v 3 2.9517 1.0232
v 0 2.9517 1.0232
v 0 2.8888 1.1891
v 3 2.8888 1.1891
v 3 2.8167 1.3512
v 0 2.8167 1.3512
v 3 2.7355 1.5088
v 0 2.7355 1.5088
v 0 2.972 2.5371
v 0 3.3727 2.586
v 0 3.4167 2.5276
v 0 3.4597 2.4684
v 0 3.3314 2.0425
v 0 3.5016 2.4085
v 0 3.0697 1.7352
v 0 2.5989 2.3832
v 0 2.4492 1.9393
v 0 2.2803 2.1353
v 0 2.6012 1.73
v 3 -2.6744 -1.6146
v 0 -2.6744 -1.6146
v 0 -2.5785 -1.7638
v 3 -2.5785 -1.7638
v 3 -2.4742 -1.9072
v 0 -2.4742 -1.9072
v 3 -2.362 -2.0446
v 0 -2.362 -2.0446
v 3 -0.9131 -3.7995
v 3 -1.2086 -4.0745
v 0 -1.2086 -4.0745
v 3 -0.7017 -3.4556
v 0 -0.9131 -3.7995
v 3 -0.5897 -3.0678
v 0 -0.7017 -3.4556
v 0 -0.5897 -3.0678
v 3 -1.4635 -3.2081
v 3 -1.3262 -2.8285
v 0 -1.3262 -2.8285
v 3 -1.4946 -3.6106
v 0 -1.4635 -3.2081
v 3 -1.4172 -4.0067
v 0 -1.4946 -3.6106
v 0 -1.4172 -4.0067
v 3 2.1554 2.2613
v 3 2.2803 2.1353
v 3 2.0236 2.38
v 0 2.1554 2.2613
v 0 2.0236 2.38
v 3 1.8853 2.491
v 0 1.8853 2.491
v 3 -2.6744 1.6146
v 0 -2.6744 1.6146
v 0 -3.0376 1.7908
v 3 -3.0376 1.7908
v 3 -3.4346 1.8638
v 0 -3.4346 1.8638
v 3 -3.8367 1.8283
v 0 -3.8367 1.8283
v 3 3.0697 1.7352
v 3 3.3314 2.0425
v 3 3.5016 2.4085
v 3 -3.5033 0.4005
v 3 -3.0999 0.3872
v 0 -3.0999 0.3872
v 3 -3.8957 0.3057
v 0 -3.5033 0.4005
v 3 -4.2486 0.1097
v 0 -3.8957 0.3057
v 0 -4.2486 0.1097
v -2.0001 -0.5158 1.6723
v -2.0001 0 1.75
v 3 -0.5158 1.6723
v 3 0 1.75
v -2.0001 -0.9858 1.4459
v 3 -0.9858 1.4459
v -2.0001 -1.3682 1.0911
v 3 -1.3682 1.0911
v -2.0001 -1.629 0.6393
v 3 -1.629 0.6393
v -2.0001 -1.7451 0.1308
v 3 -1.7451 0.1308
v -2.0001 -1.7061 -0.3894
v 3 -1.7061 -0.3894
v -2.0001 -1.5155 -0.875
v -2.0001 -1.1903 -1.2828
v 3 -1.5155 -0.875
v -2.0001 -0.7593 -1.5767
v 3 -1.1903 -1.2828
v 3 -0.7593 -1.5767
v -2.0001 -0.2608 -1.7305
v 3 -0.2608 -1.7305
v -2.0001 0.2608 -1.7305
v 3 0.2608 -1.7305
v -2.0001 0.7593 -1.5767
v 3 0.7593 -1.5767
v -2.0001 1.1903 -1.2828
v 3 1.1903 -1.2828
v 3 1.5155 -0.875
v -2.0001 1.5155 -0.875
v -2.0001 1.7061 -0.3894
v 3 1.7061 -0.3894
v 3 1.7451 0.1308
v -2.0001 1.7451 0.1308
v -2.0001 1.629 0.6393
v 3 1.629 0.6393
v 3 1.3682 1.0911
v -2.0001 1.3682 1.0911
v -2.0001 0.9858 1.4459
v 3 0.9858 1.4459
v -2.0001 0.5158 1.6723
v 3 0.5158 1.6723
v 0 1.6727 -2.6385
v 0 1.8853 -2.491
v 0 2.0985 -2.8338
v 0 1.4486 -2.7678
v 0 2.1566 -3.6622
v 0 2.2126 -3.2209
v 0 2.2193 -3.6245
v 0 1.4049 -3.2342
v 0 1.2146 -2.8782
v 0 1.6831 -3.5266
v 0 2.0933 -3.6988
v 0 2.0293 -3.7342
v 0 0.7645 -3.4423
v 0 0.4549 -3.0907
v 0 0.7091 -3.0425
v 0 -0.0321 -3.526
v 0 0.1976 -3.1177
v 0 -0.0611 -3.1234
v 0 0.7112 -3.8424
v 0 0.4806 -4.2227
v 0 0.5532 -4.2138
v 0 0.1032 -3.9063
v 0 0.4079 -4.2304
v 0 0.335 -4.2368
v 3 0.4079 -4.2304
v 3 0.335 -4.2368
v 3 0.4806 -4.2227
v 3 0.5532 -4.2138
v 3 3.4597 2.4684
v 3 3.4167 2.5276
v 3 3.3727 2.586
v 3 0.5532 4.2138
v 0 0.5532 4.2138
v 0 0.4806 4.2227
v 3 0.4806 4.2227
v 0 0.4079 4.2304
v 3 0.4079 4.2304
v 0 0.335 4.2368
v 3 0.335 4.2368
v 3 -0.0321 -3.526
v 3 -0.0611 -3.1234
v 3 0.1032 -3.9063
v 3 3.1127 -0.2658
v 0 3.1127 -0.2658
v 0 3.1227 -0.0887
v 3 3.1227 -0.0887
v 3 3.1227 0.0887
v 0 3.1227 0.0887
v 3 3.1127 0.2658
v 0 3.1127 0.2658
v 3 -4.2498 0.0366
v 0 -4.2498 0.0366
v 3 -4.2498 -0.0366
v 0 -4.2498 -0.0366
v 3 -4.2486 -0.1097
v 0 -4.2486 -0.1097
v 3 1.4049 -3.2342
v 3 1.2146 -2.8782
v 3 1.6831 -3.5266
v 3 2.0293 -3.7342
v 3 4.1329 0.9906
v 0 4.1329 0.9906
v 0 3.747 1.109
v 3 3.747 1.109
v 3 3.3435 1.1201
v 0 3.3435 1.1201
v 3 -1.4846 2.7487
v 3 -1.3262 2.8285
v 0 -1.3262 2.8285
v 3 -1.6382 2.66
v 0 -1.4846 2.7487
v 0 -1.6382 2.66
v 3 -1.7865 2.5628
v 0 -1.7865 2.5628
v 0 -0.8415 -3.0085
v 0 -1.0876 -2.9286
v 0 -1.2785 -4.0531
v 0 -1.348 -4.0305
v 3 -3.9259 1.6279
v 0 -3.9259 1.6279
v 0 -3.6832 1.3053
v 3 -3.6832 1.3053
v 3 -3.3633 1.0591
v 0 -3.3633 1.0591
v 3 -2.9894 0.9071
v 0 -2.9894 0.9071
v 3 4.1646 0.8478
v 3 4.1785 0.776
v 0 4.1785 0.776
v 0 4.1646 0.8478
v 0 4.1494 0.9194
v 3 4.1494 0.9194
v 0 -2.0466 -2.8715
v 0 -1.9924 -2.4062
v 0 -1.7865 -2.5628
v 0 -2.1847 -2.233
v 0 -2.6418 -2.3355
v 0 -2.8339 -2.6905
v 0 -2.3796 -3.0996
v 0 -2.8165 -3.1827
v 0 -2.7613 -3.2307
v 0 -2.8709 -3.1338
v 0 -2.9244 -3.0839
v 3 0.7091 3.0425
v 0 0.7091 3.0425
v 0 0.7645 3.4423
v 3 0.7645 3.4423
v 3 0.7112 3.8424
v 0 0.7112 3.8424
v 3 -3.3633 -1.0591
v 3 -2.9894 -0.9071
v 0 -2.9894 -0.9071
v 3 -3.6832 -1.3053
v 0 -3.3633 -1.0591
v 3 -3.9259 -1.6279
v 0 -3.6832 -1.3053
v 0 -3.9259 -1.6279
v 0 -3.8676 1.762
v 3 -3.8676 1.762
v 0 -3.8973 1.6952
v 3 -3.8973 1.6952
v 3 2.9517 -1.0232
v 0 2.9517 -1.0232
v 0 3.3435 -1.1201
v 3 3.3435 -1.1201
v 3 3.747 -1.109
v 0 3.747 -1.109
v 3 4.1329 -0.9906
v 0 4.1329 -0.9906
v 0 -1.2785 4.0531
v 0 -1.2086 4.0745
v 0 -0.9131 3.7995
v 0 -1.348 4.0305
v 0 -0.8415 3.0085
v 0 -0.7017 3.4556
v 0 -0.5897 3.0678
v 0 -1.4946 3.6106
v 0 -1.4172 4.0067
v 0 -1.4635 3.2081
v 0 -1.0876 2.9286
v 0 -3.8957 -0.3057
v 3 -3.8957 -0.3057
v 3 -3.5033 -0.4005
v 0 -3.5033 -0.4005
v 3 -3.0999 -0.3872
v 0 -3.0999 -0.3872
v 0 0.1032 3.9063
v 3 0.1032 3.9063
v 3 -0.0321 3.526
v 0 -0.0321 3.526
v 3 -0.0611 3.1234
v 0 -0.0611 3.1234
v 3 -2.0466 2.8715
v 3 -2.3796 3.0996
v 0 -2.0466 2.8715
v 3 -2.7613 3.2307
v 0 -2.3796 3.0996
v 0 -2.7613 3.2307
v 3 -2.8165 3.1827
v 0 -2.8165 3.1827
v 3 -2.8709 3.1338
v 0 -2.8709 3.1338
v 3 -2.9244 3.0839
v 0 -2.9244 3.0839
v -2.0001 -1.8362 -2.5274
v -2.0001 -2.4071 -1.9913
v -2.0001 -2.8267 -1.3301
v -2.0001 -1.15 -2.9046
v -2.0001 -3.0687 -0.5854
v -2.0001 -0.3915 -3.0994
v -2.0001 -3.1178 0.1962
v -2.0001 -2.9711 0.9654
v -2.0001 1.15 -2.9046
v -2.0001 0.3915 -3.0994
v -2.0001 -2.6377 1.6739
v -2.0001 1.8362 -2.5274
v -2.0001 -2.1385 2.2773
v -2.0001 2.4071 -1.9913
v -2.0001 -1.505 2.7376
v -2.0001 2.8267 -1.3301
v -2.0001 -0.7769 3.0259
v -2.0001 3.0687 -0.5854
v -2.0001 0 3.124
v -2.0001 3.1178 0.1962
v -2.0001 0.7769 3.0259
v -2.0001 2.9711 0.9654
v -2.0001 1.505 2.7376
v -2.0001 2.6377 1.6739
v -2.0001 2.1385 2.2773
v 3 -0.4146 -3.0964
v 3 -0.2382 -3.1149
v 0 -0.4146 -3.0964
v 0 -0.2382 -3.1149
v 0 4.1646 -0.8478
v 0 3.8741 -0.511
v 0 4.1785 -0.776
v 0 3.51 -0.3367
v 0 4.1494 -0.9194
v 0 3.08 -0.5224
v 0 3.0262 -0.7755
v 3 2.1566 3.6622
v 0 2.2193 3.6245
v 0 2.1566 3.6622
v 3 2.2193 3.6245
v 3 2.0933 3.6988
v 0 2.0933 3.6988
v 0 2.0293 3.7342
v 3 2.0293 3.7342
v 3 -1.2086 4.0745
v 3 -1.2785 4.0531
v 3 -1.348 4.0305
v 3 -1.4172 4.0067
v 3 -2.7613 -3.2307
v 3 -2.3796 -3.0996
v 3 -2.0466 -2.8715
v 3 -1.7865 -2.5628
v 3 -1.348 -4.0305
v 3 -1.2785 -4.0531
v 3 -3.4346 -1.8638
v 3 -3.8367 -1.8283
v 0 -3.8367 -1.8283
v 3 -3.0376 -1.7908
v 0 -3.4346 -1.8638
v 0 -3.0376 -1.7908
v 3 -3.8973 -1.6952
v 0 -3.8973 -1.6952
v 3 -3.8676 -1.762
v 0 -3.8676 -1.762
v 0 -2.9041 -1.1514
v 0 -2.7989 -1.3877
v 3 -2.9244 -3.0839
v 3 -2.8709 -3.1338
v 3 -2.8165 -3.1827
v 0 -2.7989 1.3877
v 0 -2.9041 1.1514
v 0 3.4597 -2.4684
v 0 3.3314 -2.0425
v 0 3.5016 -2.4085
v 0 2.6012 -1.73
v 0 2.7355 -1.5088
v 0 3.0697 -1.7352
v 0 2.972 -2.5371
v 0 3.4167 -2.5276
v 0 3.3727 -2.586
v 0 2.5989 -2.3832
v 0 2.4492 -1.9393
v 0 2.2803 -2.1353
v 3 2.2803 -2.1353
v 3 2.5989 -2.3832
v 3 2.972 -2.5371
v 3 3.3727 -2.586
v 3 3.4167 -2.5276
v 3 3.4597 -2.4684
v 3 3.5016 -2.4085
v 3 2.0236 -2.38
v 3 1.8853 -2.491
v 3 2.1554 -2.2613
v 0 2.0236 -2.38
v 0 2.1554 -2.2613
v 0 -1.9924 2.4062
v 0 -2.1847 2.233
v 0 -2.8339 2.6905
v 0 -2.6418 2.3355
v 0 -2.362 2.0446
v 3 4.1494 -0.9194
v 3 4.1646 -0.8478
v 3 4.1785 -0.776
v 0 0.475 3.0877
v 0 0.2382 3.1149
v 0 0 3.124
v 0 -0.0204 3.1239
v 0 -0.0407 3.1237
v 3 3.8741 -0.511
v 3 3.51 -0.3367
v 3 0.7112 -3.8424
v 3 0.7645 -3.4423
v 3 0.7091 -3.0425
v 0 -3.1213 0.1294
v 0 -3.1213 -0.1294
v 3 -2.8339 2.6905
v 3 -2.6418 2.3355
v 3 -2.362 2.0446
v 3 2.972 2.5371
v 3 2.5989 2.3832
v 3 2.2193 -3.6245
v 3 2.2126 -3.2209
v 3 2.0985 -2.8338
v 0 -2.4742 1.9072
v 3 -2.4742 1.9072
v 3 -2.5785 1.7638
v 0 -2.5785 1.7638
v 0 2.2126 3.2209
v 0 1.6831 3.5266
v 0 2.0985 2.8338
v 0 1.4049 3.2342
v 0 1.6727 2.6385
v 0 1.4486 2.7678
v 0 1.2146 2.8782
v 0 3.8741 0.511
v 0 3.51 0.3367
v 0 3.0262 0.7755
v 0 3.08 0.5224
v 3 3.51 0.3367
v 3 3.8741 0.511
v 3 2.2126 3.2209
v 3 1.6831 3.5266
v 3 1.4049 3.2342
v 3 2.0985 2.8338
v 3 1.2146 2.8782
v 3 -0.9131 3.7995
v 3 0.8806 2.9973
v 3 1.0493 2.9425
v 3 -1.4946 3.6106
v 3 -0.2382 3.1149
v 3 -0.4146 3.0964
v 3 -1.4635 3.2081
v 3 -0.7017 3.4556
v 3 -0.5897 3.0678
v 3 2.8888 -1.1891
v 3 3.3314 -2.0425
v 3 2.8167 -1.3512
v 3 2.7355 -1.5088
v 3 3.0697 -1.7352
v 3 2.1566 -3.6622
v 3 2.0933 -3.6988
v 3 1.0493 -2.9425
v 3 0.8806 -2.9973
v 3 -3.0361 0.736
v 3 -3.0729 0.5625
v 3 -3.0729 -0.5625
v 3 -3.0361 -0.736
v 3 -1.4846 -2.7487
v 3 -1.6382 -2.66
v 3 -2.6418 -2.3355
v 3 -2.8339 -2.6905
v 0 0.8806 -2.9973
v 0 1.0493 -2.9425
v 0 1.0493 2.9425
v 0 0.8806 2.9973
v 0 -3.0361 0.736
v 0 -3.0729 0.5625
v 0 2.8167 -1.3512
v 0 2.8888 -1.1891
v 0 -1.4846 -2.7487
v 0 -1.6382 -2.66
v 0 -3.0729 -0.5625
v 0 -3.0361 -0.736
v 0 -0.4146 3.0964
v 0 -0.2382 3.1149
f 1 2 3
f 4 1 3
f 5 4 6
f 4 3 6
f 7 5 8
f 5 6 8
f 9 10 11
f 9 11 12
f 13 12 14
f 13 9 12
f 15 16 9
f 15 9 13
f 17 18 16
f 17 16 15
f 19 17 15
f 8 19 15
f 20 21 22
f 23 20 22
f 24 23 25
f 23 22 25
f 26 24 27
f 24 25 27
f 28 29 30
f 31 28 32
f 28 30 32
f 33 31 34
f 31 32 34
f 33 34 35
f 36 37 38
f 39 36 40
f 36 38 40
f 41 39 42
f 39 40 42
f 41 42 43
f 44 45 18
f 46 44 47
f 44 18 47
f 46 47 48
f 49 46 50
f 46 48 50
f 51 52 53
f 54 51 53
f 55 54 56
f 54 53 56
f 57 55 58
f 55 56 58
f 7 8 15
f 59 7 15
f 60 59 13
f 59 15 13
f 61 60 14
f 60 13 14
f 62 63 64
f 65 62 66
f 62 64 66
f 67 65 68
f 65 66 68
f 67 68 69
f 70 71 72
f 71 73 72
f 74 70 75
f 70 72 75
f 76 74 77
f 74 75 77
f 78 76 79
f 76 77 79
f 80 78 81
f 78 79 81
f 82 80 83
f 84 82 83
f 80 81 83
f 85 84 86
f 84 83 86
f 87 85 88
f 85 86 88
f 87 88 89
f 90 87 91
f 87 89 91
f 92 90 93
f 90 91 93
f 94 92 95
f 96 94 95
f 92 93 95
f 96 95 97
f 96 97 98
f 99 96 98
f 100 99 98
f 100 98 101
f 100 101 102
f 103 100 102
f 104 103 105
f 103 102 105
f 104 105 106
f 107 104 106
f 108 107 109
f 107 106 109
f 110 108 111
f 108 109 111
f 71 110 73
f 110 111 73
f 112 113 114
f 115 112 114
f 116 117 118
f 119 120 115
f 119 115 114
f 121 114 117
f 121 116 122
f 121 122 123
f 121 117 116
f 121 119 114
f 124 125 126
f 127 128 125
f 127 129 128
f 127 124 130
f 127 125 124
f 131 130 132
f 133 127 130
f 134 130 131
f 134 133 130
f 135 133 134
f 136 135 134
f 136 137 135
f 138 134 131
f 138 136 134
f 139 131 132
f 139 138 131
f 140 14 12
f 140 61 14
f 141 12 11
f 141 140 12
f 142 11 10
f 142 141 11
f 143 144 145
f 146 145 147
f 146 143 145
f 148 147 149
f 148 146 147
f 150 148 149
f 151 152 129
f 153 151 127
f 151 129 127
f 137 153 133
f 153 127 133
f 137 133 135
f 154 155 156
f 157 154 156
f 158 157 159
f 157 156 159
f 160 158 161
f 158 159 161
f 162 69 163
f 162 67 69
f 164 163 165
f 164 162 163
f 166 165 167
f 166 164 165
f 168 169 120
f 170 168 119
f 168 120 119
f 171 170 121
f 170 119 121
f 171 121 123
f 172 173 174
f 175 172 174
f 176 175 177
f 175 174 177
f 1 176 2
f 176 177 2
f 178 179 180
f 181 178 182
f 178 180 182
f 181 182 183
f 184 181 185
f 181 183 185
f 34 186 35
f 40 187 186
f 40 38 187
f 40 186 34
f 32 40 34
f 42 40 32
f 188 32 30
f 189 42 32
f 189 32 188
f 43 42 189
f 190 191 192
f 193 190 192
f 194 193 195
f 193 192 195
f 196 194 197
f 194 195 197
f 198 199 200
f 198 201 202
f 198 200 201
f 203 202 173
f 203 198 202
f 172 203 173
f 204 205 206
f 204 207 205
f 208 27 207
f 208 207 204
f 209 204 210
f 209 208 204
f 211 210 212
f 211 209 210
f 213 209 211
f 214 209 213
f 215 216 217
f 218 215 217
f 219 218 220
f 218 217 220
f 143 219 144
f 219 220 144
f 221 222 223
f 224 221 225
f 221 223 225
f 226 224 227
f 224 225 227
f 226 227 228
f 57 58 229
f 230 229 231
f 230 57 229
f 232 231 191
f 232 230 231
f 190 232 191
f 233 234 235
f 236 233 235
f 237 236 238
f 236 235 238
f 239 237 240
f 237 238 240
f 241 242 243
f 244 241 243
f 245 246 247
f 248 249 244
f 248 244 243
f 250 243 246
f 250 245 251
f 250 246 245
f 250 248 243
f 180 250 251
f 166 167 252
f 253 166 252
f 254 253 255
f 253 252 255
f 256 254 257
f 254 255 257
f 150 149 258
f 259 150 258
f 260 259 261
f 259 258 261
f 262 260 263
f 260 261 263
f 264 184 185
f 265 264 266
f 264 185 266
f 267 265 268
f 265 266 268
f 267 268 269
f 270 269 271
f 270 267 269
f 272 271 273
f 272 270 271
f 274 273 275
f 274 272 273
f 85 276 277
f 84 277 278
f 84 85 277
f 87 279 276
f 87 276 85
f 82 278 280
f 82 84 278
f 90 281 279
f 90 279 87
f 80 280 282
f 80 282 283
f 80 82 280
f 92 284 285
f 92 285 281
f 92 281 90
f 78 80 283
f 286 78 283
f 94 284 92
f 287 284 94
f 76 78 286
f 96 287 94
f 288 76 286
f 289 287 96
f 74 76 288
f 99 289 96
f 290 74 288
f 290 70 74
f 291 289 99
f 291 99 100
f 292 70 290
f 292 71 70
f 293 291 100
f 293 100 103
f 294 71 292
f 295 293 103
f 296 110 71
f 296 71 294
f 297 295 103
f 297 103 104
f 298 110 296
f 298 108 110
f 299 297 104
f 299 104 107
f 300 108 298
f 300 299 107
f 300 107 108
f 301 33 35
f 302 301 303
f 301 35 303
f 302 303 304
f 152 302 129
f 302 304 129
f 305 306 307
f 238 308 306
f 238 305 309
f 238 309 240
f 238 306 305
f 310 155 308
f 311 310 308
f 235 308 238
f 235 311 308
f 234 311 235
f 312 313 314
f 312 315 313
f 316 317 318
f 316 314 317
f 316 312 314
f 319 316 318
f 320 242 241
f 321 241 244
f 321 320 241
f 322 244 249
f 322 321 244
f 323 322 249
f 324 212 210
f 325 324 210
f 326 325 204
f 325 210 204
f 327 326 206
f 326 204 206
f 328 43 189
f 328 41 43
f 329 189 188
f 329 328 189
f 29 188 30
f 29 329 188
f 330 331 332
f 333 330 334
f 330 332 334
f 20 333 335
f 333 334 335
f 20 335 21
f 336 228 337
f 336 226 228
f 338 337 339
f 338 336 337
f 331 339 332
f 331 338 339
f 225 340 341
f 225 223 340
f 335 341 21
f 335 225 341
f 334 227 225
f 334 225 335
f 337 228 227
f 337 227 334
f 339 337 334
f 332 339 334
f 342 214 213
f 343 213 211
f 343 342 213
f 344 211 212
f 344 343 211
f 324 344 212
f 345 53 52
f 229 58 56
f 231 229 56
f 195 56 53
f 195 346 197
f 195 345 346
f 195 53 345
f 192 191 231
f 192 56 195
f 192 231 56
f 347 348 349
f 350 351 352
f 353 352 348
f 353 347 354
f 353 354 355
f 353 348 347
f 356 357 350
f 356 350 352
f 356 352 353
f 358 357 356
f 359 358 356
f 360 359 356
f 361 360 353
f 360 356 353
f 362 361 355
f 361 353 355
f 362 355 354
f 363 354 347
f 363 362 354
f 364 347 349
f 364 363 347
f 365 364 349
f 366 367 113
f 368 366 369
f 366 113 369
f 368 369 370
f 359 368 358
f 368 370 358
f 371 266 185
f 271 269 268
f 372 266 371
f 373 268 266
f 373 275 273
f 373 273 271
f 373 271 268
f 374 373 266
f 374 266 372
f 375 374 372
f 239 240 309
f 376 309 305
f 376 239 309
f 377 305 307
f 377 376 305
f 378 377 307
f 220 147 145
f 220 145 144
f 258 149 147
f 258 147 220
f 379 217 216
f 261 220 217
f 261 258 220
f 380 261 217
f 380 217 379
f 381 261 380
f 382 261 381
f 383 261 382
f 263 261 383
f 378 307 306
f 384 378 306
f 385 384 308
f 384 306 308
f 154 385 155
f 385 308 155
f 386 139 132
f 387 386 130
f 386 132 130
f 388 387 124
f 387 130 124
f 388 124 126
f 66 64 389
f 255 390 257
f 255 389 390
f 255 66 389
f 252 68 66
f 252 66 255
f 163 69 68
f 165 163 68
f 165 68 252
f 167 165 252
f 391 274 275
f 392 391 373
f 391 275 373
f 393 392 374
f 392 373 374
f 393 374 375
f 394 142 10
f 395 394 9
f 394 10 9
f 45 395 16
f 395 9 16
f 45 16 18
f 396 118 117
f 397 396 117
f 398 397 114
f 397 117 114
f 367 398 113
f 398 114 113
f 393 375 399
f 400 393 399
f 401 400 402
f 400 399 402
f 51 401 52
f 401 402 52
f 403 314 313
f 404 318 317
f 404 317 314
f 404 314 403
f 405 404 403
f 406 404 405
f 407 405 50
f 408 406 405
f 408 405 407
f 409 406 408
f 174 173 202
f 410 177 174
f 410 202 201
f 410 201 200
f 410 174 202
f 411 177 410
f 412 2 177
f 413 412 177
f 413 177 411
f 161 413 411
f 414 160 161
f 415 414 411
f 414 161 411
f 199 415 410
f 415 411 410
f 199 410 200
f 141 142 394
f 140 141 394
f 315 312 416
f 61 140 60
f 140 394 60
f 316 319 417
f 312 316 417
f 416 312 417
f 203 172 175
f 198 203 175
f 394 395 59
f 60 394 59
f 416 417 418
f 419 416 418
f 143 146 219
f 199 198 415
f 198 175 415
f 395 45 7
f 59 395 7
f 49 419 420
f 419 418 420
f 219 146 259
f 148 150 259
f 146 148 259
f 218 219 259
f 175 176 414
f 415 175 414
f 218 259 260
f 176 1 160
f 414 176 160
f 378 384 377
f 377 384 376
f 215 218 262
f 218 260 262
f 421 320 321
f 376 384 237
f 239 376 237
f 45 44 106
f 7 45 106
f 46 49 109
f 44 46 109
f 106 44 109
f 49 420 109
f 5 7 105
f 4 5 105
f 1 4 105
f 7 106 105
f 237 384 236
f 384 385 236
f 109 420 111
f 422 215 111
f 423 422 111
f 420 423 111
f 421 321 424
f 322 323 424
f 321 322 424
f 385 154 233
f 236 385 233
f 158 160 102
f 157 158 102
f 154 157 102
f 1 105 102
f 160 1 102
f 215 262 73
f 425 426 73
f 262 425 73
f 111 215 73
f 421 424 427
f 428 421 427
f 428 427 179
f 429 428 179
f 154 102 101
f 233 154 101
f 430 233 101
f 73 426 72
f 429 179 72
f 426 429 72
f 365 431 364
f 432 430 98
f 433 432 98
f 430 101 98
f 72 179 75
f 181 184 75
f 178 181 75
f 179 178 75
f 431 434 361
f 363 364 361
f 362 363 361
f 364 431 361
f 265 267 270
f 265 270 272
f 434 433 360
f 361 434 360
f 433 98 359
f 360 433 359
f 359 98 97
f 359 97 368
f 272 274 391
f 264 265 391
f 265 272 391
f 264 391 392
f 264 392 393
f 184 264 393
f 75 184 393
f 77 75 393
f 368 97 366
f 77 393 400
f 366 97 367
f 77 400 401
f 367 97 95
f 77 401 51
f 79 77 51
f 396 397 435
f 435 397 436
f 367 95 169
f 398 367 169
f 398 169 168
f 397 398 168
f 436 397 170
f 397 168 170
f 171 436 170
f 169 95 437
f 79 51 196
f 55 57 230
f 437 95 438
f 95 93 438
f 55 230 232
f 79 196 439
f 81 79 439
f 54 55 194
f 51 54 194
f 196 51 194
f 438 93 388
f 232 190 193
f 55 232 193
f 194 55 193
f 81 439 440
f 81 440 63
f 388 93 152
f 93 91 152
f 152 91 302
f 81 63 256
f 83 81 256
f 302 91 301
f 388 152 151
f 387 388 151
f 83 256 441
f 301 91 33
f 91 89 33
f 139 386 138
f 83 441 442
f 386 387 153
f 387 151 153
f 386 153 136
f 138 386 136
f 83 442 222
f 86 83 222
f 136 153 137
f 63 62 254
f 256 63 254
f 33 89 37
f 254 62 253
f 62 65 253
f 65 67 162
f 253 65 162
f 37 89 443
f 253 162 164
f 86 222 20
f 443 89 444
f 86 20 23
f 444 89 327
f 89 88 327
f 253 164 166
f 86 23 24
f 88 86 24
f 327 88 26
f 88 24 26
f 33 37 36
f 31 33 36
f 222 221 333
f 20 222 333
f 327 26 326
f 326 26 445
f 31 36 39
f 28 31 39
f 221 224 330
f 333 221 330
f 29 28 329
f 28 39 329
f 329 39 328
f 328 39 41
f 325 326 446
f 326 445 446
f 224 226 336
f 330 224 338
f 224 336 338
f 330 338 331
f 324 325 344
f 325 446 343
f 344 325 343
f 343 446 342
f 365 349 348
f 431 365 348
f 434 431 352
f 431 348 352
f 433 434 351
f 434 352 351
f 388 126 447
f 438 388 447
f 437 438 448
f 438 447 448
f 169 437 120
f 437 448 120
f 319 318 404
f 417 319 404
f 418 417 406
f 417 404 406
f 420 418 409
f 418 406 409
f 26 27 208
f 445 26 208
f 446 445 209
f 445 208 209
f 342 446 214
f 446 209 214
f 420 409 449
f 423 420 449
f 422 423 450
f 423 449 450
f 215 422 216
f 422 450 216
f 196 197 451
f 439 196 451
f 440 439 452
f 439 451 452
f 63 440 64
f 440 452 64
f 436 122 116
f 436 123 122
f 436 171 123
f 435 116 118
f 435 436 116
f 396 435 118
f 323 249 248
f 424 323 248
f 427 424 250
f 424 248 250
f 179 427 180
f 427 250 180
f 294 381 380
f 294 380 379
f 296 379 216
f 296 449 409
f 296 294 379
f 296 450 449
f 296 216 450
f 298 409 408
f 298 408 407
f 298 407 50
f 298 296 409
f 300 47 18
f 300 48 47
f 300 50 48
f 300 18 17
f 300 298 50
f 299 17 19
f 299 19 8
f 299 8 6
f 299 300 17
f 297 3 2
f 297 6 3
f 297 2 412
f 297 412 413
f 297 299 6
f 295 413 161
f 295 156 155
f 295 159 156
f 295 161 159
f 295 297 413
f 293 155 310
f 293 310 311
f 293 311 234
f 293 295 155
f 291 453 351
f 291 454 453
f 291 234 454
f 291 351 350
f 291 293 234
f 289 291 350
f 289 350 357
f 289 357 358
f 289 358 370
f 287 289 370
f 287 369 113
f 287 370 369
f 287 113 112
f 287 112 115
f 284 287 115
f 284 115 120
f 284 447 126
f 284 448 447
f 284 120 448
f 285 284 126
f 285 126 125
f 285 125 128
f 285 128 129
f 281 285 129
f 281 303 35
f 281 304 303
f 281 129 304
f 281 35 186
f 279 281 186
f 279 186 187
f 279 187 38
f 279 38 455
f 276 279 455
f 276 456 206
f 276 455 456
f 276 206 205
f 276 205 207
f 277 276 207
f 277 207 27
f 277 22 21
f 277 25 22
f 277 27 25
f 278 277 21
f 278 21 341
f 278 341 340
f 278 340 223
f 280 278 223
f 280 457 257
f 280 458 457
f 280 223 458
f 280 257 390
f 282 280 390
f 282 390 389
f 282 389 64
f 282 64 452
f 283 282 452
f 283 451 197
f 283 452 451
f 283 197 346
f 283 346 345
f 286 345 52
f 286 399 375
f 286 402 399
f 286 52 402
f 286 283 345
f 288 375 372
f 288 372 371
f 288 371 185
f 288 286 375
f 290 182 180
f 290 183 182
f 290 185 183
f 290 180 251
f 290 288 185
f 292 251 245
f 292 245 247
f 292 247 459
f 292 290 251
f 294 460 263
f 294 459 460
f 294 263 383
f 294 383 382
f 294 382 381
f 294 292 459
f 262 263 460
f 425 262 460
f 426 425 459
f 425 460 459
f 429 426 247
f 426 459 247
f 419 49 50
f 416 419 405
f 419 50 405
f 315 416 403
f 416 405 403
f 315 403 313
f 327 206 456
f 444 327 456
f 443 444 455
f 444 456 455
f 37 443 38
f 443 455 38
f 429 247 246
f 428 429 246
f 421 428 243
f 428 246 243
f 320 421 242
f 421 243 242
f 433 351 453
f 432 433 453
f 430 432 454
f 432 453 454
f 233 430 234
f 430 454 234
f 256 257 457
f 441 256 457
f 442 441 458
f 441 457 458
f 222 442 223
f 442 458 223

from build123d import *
from build123d.topology import SkipClean

# Parameters (mm, degrees)
BASPROSKE_W      = 3
BASPROSKE_H      = 4.25
TOOTHCUT_DEPTH   = 7.717514421
TEETHCUTS_COUNT  = 15
TEETHCUTS_ANGLE  = 336
HUBNEARONE_START = 2.0000508
HUBNEAONESKE_R   = 3.124
HUBNEARONE_DEPTH = 2.0000508
BORSKE_R         = 1.75
BORE_DEPTH       = 5.0000508


with BuildPart() as part:
    # BasProSke → Base-Revolve (revolve)
    with BuildSketch(Plane(origin=(0, 0, 0), x_dir=(1, 0, 0), z_dir=(0, 1, 0)), mode=Mode.PRIVATE) as base_revolve_sk:
        with Locations((1.5, 2.125)):
            Rectangle(BASPROSKE_W, BASPROSKE_H)
    revolve(base_revolve_sk.sketch.rotate(Axis((-10, 0, 0), (1, 0, 0)), 180), axis=Axis((-10, 0, 0), (1, 0, 0)))

    # TooCutSke → ToothCut (cut, through all)
    with BuildSketch(Plane(origin=(0, 0, 0), x_dir=(0, 0, -1), z_dir=(1, 0, 0))):
        with BuildLine():
            ThreePointArc((0.265767165, 3.112674704), (0, 3.124), (-0.265767165, 3.112674704))
            ThreePointArc((-0.265767165, 3.112674704), (-0.418628877, 3.712626775), (-0.800767345, 4.19974009))
            ThreePointArc((-0.800767345, 4.19974009), (0, 4.2754), (0.800767345, 4.19974009))
            ThreePointArc((0.800767345, 4.19974009), (0.418628877, 3.712626775), (0.265767165, 3.112674704))
        make_face()
    toothcut = extrude(amount=TOOTHCUT_DEPTH, mode=Mode.SUBTRACT)

    # TeethCuts: ToothCut ×15 about axis
    teethcuts_axis = Axis((-10, 0, 0), (1, 0, 0))
    for i in range(1, TEETHCUTS_COUNT):
        add(toothcut.rotate(teethcuts_axis, i * TEETHCUTS_ANGLE / (TEETHCUTS_COUNT - 1)), mode=Mode.SUBTRACT)

    # HubNeaOneSke → HubNearOne (add)
    with SkipClean():  # the faces are left unmerged after this step: merging them gives an invalid solid
        with BuildSketch(Plane.ZY.offset(HUBNEARONE_START)):
            Circle(HUBNEAONESKE_R)
        extrude(amount=-HUBNEARONE_DEPTH)

    # BorSke → Bore (cut, symmetric)
    with SkipClean():  # the faces are left unmerged after this step: merging them gives an invalid solid
        with BuildSketch(Plane(origin=(0, 0, 0), x_dir=(0, 0, -1), z_dir=(1, 0, 0))):
            with Locations(Location((0, 0, 0), (0, 0, 180))):
                Circle(BORSKE_R)
        extrude(amount=BORE_DEPTH, both=True, mode=Mode.SUBTRACT)


solid = part.part
